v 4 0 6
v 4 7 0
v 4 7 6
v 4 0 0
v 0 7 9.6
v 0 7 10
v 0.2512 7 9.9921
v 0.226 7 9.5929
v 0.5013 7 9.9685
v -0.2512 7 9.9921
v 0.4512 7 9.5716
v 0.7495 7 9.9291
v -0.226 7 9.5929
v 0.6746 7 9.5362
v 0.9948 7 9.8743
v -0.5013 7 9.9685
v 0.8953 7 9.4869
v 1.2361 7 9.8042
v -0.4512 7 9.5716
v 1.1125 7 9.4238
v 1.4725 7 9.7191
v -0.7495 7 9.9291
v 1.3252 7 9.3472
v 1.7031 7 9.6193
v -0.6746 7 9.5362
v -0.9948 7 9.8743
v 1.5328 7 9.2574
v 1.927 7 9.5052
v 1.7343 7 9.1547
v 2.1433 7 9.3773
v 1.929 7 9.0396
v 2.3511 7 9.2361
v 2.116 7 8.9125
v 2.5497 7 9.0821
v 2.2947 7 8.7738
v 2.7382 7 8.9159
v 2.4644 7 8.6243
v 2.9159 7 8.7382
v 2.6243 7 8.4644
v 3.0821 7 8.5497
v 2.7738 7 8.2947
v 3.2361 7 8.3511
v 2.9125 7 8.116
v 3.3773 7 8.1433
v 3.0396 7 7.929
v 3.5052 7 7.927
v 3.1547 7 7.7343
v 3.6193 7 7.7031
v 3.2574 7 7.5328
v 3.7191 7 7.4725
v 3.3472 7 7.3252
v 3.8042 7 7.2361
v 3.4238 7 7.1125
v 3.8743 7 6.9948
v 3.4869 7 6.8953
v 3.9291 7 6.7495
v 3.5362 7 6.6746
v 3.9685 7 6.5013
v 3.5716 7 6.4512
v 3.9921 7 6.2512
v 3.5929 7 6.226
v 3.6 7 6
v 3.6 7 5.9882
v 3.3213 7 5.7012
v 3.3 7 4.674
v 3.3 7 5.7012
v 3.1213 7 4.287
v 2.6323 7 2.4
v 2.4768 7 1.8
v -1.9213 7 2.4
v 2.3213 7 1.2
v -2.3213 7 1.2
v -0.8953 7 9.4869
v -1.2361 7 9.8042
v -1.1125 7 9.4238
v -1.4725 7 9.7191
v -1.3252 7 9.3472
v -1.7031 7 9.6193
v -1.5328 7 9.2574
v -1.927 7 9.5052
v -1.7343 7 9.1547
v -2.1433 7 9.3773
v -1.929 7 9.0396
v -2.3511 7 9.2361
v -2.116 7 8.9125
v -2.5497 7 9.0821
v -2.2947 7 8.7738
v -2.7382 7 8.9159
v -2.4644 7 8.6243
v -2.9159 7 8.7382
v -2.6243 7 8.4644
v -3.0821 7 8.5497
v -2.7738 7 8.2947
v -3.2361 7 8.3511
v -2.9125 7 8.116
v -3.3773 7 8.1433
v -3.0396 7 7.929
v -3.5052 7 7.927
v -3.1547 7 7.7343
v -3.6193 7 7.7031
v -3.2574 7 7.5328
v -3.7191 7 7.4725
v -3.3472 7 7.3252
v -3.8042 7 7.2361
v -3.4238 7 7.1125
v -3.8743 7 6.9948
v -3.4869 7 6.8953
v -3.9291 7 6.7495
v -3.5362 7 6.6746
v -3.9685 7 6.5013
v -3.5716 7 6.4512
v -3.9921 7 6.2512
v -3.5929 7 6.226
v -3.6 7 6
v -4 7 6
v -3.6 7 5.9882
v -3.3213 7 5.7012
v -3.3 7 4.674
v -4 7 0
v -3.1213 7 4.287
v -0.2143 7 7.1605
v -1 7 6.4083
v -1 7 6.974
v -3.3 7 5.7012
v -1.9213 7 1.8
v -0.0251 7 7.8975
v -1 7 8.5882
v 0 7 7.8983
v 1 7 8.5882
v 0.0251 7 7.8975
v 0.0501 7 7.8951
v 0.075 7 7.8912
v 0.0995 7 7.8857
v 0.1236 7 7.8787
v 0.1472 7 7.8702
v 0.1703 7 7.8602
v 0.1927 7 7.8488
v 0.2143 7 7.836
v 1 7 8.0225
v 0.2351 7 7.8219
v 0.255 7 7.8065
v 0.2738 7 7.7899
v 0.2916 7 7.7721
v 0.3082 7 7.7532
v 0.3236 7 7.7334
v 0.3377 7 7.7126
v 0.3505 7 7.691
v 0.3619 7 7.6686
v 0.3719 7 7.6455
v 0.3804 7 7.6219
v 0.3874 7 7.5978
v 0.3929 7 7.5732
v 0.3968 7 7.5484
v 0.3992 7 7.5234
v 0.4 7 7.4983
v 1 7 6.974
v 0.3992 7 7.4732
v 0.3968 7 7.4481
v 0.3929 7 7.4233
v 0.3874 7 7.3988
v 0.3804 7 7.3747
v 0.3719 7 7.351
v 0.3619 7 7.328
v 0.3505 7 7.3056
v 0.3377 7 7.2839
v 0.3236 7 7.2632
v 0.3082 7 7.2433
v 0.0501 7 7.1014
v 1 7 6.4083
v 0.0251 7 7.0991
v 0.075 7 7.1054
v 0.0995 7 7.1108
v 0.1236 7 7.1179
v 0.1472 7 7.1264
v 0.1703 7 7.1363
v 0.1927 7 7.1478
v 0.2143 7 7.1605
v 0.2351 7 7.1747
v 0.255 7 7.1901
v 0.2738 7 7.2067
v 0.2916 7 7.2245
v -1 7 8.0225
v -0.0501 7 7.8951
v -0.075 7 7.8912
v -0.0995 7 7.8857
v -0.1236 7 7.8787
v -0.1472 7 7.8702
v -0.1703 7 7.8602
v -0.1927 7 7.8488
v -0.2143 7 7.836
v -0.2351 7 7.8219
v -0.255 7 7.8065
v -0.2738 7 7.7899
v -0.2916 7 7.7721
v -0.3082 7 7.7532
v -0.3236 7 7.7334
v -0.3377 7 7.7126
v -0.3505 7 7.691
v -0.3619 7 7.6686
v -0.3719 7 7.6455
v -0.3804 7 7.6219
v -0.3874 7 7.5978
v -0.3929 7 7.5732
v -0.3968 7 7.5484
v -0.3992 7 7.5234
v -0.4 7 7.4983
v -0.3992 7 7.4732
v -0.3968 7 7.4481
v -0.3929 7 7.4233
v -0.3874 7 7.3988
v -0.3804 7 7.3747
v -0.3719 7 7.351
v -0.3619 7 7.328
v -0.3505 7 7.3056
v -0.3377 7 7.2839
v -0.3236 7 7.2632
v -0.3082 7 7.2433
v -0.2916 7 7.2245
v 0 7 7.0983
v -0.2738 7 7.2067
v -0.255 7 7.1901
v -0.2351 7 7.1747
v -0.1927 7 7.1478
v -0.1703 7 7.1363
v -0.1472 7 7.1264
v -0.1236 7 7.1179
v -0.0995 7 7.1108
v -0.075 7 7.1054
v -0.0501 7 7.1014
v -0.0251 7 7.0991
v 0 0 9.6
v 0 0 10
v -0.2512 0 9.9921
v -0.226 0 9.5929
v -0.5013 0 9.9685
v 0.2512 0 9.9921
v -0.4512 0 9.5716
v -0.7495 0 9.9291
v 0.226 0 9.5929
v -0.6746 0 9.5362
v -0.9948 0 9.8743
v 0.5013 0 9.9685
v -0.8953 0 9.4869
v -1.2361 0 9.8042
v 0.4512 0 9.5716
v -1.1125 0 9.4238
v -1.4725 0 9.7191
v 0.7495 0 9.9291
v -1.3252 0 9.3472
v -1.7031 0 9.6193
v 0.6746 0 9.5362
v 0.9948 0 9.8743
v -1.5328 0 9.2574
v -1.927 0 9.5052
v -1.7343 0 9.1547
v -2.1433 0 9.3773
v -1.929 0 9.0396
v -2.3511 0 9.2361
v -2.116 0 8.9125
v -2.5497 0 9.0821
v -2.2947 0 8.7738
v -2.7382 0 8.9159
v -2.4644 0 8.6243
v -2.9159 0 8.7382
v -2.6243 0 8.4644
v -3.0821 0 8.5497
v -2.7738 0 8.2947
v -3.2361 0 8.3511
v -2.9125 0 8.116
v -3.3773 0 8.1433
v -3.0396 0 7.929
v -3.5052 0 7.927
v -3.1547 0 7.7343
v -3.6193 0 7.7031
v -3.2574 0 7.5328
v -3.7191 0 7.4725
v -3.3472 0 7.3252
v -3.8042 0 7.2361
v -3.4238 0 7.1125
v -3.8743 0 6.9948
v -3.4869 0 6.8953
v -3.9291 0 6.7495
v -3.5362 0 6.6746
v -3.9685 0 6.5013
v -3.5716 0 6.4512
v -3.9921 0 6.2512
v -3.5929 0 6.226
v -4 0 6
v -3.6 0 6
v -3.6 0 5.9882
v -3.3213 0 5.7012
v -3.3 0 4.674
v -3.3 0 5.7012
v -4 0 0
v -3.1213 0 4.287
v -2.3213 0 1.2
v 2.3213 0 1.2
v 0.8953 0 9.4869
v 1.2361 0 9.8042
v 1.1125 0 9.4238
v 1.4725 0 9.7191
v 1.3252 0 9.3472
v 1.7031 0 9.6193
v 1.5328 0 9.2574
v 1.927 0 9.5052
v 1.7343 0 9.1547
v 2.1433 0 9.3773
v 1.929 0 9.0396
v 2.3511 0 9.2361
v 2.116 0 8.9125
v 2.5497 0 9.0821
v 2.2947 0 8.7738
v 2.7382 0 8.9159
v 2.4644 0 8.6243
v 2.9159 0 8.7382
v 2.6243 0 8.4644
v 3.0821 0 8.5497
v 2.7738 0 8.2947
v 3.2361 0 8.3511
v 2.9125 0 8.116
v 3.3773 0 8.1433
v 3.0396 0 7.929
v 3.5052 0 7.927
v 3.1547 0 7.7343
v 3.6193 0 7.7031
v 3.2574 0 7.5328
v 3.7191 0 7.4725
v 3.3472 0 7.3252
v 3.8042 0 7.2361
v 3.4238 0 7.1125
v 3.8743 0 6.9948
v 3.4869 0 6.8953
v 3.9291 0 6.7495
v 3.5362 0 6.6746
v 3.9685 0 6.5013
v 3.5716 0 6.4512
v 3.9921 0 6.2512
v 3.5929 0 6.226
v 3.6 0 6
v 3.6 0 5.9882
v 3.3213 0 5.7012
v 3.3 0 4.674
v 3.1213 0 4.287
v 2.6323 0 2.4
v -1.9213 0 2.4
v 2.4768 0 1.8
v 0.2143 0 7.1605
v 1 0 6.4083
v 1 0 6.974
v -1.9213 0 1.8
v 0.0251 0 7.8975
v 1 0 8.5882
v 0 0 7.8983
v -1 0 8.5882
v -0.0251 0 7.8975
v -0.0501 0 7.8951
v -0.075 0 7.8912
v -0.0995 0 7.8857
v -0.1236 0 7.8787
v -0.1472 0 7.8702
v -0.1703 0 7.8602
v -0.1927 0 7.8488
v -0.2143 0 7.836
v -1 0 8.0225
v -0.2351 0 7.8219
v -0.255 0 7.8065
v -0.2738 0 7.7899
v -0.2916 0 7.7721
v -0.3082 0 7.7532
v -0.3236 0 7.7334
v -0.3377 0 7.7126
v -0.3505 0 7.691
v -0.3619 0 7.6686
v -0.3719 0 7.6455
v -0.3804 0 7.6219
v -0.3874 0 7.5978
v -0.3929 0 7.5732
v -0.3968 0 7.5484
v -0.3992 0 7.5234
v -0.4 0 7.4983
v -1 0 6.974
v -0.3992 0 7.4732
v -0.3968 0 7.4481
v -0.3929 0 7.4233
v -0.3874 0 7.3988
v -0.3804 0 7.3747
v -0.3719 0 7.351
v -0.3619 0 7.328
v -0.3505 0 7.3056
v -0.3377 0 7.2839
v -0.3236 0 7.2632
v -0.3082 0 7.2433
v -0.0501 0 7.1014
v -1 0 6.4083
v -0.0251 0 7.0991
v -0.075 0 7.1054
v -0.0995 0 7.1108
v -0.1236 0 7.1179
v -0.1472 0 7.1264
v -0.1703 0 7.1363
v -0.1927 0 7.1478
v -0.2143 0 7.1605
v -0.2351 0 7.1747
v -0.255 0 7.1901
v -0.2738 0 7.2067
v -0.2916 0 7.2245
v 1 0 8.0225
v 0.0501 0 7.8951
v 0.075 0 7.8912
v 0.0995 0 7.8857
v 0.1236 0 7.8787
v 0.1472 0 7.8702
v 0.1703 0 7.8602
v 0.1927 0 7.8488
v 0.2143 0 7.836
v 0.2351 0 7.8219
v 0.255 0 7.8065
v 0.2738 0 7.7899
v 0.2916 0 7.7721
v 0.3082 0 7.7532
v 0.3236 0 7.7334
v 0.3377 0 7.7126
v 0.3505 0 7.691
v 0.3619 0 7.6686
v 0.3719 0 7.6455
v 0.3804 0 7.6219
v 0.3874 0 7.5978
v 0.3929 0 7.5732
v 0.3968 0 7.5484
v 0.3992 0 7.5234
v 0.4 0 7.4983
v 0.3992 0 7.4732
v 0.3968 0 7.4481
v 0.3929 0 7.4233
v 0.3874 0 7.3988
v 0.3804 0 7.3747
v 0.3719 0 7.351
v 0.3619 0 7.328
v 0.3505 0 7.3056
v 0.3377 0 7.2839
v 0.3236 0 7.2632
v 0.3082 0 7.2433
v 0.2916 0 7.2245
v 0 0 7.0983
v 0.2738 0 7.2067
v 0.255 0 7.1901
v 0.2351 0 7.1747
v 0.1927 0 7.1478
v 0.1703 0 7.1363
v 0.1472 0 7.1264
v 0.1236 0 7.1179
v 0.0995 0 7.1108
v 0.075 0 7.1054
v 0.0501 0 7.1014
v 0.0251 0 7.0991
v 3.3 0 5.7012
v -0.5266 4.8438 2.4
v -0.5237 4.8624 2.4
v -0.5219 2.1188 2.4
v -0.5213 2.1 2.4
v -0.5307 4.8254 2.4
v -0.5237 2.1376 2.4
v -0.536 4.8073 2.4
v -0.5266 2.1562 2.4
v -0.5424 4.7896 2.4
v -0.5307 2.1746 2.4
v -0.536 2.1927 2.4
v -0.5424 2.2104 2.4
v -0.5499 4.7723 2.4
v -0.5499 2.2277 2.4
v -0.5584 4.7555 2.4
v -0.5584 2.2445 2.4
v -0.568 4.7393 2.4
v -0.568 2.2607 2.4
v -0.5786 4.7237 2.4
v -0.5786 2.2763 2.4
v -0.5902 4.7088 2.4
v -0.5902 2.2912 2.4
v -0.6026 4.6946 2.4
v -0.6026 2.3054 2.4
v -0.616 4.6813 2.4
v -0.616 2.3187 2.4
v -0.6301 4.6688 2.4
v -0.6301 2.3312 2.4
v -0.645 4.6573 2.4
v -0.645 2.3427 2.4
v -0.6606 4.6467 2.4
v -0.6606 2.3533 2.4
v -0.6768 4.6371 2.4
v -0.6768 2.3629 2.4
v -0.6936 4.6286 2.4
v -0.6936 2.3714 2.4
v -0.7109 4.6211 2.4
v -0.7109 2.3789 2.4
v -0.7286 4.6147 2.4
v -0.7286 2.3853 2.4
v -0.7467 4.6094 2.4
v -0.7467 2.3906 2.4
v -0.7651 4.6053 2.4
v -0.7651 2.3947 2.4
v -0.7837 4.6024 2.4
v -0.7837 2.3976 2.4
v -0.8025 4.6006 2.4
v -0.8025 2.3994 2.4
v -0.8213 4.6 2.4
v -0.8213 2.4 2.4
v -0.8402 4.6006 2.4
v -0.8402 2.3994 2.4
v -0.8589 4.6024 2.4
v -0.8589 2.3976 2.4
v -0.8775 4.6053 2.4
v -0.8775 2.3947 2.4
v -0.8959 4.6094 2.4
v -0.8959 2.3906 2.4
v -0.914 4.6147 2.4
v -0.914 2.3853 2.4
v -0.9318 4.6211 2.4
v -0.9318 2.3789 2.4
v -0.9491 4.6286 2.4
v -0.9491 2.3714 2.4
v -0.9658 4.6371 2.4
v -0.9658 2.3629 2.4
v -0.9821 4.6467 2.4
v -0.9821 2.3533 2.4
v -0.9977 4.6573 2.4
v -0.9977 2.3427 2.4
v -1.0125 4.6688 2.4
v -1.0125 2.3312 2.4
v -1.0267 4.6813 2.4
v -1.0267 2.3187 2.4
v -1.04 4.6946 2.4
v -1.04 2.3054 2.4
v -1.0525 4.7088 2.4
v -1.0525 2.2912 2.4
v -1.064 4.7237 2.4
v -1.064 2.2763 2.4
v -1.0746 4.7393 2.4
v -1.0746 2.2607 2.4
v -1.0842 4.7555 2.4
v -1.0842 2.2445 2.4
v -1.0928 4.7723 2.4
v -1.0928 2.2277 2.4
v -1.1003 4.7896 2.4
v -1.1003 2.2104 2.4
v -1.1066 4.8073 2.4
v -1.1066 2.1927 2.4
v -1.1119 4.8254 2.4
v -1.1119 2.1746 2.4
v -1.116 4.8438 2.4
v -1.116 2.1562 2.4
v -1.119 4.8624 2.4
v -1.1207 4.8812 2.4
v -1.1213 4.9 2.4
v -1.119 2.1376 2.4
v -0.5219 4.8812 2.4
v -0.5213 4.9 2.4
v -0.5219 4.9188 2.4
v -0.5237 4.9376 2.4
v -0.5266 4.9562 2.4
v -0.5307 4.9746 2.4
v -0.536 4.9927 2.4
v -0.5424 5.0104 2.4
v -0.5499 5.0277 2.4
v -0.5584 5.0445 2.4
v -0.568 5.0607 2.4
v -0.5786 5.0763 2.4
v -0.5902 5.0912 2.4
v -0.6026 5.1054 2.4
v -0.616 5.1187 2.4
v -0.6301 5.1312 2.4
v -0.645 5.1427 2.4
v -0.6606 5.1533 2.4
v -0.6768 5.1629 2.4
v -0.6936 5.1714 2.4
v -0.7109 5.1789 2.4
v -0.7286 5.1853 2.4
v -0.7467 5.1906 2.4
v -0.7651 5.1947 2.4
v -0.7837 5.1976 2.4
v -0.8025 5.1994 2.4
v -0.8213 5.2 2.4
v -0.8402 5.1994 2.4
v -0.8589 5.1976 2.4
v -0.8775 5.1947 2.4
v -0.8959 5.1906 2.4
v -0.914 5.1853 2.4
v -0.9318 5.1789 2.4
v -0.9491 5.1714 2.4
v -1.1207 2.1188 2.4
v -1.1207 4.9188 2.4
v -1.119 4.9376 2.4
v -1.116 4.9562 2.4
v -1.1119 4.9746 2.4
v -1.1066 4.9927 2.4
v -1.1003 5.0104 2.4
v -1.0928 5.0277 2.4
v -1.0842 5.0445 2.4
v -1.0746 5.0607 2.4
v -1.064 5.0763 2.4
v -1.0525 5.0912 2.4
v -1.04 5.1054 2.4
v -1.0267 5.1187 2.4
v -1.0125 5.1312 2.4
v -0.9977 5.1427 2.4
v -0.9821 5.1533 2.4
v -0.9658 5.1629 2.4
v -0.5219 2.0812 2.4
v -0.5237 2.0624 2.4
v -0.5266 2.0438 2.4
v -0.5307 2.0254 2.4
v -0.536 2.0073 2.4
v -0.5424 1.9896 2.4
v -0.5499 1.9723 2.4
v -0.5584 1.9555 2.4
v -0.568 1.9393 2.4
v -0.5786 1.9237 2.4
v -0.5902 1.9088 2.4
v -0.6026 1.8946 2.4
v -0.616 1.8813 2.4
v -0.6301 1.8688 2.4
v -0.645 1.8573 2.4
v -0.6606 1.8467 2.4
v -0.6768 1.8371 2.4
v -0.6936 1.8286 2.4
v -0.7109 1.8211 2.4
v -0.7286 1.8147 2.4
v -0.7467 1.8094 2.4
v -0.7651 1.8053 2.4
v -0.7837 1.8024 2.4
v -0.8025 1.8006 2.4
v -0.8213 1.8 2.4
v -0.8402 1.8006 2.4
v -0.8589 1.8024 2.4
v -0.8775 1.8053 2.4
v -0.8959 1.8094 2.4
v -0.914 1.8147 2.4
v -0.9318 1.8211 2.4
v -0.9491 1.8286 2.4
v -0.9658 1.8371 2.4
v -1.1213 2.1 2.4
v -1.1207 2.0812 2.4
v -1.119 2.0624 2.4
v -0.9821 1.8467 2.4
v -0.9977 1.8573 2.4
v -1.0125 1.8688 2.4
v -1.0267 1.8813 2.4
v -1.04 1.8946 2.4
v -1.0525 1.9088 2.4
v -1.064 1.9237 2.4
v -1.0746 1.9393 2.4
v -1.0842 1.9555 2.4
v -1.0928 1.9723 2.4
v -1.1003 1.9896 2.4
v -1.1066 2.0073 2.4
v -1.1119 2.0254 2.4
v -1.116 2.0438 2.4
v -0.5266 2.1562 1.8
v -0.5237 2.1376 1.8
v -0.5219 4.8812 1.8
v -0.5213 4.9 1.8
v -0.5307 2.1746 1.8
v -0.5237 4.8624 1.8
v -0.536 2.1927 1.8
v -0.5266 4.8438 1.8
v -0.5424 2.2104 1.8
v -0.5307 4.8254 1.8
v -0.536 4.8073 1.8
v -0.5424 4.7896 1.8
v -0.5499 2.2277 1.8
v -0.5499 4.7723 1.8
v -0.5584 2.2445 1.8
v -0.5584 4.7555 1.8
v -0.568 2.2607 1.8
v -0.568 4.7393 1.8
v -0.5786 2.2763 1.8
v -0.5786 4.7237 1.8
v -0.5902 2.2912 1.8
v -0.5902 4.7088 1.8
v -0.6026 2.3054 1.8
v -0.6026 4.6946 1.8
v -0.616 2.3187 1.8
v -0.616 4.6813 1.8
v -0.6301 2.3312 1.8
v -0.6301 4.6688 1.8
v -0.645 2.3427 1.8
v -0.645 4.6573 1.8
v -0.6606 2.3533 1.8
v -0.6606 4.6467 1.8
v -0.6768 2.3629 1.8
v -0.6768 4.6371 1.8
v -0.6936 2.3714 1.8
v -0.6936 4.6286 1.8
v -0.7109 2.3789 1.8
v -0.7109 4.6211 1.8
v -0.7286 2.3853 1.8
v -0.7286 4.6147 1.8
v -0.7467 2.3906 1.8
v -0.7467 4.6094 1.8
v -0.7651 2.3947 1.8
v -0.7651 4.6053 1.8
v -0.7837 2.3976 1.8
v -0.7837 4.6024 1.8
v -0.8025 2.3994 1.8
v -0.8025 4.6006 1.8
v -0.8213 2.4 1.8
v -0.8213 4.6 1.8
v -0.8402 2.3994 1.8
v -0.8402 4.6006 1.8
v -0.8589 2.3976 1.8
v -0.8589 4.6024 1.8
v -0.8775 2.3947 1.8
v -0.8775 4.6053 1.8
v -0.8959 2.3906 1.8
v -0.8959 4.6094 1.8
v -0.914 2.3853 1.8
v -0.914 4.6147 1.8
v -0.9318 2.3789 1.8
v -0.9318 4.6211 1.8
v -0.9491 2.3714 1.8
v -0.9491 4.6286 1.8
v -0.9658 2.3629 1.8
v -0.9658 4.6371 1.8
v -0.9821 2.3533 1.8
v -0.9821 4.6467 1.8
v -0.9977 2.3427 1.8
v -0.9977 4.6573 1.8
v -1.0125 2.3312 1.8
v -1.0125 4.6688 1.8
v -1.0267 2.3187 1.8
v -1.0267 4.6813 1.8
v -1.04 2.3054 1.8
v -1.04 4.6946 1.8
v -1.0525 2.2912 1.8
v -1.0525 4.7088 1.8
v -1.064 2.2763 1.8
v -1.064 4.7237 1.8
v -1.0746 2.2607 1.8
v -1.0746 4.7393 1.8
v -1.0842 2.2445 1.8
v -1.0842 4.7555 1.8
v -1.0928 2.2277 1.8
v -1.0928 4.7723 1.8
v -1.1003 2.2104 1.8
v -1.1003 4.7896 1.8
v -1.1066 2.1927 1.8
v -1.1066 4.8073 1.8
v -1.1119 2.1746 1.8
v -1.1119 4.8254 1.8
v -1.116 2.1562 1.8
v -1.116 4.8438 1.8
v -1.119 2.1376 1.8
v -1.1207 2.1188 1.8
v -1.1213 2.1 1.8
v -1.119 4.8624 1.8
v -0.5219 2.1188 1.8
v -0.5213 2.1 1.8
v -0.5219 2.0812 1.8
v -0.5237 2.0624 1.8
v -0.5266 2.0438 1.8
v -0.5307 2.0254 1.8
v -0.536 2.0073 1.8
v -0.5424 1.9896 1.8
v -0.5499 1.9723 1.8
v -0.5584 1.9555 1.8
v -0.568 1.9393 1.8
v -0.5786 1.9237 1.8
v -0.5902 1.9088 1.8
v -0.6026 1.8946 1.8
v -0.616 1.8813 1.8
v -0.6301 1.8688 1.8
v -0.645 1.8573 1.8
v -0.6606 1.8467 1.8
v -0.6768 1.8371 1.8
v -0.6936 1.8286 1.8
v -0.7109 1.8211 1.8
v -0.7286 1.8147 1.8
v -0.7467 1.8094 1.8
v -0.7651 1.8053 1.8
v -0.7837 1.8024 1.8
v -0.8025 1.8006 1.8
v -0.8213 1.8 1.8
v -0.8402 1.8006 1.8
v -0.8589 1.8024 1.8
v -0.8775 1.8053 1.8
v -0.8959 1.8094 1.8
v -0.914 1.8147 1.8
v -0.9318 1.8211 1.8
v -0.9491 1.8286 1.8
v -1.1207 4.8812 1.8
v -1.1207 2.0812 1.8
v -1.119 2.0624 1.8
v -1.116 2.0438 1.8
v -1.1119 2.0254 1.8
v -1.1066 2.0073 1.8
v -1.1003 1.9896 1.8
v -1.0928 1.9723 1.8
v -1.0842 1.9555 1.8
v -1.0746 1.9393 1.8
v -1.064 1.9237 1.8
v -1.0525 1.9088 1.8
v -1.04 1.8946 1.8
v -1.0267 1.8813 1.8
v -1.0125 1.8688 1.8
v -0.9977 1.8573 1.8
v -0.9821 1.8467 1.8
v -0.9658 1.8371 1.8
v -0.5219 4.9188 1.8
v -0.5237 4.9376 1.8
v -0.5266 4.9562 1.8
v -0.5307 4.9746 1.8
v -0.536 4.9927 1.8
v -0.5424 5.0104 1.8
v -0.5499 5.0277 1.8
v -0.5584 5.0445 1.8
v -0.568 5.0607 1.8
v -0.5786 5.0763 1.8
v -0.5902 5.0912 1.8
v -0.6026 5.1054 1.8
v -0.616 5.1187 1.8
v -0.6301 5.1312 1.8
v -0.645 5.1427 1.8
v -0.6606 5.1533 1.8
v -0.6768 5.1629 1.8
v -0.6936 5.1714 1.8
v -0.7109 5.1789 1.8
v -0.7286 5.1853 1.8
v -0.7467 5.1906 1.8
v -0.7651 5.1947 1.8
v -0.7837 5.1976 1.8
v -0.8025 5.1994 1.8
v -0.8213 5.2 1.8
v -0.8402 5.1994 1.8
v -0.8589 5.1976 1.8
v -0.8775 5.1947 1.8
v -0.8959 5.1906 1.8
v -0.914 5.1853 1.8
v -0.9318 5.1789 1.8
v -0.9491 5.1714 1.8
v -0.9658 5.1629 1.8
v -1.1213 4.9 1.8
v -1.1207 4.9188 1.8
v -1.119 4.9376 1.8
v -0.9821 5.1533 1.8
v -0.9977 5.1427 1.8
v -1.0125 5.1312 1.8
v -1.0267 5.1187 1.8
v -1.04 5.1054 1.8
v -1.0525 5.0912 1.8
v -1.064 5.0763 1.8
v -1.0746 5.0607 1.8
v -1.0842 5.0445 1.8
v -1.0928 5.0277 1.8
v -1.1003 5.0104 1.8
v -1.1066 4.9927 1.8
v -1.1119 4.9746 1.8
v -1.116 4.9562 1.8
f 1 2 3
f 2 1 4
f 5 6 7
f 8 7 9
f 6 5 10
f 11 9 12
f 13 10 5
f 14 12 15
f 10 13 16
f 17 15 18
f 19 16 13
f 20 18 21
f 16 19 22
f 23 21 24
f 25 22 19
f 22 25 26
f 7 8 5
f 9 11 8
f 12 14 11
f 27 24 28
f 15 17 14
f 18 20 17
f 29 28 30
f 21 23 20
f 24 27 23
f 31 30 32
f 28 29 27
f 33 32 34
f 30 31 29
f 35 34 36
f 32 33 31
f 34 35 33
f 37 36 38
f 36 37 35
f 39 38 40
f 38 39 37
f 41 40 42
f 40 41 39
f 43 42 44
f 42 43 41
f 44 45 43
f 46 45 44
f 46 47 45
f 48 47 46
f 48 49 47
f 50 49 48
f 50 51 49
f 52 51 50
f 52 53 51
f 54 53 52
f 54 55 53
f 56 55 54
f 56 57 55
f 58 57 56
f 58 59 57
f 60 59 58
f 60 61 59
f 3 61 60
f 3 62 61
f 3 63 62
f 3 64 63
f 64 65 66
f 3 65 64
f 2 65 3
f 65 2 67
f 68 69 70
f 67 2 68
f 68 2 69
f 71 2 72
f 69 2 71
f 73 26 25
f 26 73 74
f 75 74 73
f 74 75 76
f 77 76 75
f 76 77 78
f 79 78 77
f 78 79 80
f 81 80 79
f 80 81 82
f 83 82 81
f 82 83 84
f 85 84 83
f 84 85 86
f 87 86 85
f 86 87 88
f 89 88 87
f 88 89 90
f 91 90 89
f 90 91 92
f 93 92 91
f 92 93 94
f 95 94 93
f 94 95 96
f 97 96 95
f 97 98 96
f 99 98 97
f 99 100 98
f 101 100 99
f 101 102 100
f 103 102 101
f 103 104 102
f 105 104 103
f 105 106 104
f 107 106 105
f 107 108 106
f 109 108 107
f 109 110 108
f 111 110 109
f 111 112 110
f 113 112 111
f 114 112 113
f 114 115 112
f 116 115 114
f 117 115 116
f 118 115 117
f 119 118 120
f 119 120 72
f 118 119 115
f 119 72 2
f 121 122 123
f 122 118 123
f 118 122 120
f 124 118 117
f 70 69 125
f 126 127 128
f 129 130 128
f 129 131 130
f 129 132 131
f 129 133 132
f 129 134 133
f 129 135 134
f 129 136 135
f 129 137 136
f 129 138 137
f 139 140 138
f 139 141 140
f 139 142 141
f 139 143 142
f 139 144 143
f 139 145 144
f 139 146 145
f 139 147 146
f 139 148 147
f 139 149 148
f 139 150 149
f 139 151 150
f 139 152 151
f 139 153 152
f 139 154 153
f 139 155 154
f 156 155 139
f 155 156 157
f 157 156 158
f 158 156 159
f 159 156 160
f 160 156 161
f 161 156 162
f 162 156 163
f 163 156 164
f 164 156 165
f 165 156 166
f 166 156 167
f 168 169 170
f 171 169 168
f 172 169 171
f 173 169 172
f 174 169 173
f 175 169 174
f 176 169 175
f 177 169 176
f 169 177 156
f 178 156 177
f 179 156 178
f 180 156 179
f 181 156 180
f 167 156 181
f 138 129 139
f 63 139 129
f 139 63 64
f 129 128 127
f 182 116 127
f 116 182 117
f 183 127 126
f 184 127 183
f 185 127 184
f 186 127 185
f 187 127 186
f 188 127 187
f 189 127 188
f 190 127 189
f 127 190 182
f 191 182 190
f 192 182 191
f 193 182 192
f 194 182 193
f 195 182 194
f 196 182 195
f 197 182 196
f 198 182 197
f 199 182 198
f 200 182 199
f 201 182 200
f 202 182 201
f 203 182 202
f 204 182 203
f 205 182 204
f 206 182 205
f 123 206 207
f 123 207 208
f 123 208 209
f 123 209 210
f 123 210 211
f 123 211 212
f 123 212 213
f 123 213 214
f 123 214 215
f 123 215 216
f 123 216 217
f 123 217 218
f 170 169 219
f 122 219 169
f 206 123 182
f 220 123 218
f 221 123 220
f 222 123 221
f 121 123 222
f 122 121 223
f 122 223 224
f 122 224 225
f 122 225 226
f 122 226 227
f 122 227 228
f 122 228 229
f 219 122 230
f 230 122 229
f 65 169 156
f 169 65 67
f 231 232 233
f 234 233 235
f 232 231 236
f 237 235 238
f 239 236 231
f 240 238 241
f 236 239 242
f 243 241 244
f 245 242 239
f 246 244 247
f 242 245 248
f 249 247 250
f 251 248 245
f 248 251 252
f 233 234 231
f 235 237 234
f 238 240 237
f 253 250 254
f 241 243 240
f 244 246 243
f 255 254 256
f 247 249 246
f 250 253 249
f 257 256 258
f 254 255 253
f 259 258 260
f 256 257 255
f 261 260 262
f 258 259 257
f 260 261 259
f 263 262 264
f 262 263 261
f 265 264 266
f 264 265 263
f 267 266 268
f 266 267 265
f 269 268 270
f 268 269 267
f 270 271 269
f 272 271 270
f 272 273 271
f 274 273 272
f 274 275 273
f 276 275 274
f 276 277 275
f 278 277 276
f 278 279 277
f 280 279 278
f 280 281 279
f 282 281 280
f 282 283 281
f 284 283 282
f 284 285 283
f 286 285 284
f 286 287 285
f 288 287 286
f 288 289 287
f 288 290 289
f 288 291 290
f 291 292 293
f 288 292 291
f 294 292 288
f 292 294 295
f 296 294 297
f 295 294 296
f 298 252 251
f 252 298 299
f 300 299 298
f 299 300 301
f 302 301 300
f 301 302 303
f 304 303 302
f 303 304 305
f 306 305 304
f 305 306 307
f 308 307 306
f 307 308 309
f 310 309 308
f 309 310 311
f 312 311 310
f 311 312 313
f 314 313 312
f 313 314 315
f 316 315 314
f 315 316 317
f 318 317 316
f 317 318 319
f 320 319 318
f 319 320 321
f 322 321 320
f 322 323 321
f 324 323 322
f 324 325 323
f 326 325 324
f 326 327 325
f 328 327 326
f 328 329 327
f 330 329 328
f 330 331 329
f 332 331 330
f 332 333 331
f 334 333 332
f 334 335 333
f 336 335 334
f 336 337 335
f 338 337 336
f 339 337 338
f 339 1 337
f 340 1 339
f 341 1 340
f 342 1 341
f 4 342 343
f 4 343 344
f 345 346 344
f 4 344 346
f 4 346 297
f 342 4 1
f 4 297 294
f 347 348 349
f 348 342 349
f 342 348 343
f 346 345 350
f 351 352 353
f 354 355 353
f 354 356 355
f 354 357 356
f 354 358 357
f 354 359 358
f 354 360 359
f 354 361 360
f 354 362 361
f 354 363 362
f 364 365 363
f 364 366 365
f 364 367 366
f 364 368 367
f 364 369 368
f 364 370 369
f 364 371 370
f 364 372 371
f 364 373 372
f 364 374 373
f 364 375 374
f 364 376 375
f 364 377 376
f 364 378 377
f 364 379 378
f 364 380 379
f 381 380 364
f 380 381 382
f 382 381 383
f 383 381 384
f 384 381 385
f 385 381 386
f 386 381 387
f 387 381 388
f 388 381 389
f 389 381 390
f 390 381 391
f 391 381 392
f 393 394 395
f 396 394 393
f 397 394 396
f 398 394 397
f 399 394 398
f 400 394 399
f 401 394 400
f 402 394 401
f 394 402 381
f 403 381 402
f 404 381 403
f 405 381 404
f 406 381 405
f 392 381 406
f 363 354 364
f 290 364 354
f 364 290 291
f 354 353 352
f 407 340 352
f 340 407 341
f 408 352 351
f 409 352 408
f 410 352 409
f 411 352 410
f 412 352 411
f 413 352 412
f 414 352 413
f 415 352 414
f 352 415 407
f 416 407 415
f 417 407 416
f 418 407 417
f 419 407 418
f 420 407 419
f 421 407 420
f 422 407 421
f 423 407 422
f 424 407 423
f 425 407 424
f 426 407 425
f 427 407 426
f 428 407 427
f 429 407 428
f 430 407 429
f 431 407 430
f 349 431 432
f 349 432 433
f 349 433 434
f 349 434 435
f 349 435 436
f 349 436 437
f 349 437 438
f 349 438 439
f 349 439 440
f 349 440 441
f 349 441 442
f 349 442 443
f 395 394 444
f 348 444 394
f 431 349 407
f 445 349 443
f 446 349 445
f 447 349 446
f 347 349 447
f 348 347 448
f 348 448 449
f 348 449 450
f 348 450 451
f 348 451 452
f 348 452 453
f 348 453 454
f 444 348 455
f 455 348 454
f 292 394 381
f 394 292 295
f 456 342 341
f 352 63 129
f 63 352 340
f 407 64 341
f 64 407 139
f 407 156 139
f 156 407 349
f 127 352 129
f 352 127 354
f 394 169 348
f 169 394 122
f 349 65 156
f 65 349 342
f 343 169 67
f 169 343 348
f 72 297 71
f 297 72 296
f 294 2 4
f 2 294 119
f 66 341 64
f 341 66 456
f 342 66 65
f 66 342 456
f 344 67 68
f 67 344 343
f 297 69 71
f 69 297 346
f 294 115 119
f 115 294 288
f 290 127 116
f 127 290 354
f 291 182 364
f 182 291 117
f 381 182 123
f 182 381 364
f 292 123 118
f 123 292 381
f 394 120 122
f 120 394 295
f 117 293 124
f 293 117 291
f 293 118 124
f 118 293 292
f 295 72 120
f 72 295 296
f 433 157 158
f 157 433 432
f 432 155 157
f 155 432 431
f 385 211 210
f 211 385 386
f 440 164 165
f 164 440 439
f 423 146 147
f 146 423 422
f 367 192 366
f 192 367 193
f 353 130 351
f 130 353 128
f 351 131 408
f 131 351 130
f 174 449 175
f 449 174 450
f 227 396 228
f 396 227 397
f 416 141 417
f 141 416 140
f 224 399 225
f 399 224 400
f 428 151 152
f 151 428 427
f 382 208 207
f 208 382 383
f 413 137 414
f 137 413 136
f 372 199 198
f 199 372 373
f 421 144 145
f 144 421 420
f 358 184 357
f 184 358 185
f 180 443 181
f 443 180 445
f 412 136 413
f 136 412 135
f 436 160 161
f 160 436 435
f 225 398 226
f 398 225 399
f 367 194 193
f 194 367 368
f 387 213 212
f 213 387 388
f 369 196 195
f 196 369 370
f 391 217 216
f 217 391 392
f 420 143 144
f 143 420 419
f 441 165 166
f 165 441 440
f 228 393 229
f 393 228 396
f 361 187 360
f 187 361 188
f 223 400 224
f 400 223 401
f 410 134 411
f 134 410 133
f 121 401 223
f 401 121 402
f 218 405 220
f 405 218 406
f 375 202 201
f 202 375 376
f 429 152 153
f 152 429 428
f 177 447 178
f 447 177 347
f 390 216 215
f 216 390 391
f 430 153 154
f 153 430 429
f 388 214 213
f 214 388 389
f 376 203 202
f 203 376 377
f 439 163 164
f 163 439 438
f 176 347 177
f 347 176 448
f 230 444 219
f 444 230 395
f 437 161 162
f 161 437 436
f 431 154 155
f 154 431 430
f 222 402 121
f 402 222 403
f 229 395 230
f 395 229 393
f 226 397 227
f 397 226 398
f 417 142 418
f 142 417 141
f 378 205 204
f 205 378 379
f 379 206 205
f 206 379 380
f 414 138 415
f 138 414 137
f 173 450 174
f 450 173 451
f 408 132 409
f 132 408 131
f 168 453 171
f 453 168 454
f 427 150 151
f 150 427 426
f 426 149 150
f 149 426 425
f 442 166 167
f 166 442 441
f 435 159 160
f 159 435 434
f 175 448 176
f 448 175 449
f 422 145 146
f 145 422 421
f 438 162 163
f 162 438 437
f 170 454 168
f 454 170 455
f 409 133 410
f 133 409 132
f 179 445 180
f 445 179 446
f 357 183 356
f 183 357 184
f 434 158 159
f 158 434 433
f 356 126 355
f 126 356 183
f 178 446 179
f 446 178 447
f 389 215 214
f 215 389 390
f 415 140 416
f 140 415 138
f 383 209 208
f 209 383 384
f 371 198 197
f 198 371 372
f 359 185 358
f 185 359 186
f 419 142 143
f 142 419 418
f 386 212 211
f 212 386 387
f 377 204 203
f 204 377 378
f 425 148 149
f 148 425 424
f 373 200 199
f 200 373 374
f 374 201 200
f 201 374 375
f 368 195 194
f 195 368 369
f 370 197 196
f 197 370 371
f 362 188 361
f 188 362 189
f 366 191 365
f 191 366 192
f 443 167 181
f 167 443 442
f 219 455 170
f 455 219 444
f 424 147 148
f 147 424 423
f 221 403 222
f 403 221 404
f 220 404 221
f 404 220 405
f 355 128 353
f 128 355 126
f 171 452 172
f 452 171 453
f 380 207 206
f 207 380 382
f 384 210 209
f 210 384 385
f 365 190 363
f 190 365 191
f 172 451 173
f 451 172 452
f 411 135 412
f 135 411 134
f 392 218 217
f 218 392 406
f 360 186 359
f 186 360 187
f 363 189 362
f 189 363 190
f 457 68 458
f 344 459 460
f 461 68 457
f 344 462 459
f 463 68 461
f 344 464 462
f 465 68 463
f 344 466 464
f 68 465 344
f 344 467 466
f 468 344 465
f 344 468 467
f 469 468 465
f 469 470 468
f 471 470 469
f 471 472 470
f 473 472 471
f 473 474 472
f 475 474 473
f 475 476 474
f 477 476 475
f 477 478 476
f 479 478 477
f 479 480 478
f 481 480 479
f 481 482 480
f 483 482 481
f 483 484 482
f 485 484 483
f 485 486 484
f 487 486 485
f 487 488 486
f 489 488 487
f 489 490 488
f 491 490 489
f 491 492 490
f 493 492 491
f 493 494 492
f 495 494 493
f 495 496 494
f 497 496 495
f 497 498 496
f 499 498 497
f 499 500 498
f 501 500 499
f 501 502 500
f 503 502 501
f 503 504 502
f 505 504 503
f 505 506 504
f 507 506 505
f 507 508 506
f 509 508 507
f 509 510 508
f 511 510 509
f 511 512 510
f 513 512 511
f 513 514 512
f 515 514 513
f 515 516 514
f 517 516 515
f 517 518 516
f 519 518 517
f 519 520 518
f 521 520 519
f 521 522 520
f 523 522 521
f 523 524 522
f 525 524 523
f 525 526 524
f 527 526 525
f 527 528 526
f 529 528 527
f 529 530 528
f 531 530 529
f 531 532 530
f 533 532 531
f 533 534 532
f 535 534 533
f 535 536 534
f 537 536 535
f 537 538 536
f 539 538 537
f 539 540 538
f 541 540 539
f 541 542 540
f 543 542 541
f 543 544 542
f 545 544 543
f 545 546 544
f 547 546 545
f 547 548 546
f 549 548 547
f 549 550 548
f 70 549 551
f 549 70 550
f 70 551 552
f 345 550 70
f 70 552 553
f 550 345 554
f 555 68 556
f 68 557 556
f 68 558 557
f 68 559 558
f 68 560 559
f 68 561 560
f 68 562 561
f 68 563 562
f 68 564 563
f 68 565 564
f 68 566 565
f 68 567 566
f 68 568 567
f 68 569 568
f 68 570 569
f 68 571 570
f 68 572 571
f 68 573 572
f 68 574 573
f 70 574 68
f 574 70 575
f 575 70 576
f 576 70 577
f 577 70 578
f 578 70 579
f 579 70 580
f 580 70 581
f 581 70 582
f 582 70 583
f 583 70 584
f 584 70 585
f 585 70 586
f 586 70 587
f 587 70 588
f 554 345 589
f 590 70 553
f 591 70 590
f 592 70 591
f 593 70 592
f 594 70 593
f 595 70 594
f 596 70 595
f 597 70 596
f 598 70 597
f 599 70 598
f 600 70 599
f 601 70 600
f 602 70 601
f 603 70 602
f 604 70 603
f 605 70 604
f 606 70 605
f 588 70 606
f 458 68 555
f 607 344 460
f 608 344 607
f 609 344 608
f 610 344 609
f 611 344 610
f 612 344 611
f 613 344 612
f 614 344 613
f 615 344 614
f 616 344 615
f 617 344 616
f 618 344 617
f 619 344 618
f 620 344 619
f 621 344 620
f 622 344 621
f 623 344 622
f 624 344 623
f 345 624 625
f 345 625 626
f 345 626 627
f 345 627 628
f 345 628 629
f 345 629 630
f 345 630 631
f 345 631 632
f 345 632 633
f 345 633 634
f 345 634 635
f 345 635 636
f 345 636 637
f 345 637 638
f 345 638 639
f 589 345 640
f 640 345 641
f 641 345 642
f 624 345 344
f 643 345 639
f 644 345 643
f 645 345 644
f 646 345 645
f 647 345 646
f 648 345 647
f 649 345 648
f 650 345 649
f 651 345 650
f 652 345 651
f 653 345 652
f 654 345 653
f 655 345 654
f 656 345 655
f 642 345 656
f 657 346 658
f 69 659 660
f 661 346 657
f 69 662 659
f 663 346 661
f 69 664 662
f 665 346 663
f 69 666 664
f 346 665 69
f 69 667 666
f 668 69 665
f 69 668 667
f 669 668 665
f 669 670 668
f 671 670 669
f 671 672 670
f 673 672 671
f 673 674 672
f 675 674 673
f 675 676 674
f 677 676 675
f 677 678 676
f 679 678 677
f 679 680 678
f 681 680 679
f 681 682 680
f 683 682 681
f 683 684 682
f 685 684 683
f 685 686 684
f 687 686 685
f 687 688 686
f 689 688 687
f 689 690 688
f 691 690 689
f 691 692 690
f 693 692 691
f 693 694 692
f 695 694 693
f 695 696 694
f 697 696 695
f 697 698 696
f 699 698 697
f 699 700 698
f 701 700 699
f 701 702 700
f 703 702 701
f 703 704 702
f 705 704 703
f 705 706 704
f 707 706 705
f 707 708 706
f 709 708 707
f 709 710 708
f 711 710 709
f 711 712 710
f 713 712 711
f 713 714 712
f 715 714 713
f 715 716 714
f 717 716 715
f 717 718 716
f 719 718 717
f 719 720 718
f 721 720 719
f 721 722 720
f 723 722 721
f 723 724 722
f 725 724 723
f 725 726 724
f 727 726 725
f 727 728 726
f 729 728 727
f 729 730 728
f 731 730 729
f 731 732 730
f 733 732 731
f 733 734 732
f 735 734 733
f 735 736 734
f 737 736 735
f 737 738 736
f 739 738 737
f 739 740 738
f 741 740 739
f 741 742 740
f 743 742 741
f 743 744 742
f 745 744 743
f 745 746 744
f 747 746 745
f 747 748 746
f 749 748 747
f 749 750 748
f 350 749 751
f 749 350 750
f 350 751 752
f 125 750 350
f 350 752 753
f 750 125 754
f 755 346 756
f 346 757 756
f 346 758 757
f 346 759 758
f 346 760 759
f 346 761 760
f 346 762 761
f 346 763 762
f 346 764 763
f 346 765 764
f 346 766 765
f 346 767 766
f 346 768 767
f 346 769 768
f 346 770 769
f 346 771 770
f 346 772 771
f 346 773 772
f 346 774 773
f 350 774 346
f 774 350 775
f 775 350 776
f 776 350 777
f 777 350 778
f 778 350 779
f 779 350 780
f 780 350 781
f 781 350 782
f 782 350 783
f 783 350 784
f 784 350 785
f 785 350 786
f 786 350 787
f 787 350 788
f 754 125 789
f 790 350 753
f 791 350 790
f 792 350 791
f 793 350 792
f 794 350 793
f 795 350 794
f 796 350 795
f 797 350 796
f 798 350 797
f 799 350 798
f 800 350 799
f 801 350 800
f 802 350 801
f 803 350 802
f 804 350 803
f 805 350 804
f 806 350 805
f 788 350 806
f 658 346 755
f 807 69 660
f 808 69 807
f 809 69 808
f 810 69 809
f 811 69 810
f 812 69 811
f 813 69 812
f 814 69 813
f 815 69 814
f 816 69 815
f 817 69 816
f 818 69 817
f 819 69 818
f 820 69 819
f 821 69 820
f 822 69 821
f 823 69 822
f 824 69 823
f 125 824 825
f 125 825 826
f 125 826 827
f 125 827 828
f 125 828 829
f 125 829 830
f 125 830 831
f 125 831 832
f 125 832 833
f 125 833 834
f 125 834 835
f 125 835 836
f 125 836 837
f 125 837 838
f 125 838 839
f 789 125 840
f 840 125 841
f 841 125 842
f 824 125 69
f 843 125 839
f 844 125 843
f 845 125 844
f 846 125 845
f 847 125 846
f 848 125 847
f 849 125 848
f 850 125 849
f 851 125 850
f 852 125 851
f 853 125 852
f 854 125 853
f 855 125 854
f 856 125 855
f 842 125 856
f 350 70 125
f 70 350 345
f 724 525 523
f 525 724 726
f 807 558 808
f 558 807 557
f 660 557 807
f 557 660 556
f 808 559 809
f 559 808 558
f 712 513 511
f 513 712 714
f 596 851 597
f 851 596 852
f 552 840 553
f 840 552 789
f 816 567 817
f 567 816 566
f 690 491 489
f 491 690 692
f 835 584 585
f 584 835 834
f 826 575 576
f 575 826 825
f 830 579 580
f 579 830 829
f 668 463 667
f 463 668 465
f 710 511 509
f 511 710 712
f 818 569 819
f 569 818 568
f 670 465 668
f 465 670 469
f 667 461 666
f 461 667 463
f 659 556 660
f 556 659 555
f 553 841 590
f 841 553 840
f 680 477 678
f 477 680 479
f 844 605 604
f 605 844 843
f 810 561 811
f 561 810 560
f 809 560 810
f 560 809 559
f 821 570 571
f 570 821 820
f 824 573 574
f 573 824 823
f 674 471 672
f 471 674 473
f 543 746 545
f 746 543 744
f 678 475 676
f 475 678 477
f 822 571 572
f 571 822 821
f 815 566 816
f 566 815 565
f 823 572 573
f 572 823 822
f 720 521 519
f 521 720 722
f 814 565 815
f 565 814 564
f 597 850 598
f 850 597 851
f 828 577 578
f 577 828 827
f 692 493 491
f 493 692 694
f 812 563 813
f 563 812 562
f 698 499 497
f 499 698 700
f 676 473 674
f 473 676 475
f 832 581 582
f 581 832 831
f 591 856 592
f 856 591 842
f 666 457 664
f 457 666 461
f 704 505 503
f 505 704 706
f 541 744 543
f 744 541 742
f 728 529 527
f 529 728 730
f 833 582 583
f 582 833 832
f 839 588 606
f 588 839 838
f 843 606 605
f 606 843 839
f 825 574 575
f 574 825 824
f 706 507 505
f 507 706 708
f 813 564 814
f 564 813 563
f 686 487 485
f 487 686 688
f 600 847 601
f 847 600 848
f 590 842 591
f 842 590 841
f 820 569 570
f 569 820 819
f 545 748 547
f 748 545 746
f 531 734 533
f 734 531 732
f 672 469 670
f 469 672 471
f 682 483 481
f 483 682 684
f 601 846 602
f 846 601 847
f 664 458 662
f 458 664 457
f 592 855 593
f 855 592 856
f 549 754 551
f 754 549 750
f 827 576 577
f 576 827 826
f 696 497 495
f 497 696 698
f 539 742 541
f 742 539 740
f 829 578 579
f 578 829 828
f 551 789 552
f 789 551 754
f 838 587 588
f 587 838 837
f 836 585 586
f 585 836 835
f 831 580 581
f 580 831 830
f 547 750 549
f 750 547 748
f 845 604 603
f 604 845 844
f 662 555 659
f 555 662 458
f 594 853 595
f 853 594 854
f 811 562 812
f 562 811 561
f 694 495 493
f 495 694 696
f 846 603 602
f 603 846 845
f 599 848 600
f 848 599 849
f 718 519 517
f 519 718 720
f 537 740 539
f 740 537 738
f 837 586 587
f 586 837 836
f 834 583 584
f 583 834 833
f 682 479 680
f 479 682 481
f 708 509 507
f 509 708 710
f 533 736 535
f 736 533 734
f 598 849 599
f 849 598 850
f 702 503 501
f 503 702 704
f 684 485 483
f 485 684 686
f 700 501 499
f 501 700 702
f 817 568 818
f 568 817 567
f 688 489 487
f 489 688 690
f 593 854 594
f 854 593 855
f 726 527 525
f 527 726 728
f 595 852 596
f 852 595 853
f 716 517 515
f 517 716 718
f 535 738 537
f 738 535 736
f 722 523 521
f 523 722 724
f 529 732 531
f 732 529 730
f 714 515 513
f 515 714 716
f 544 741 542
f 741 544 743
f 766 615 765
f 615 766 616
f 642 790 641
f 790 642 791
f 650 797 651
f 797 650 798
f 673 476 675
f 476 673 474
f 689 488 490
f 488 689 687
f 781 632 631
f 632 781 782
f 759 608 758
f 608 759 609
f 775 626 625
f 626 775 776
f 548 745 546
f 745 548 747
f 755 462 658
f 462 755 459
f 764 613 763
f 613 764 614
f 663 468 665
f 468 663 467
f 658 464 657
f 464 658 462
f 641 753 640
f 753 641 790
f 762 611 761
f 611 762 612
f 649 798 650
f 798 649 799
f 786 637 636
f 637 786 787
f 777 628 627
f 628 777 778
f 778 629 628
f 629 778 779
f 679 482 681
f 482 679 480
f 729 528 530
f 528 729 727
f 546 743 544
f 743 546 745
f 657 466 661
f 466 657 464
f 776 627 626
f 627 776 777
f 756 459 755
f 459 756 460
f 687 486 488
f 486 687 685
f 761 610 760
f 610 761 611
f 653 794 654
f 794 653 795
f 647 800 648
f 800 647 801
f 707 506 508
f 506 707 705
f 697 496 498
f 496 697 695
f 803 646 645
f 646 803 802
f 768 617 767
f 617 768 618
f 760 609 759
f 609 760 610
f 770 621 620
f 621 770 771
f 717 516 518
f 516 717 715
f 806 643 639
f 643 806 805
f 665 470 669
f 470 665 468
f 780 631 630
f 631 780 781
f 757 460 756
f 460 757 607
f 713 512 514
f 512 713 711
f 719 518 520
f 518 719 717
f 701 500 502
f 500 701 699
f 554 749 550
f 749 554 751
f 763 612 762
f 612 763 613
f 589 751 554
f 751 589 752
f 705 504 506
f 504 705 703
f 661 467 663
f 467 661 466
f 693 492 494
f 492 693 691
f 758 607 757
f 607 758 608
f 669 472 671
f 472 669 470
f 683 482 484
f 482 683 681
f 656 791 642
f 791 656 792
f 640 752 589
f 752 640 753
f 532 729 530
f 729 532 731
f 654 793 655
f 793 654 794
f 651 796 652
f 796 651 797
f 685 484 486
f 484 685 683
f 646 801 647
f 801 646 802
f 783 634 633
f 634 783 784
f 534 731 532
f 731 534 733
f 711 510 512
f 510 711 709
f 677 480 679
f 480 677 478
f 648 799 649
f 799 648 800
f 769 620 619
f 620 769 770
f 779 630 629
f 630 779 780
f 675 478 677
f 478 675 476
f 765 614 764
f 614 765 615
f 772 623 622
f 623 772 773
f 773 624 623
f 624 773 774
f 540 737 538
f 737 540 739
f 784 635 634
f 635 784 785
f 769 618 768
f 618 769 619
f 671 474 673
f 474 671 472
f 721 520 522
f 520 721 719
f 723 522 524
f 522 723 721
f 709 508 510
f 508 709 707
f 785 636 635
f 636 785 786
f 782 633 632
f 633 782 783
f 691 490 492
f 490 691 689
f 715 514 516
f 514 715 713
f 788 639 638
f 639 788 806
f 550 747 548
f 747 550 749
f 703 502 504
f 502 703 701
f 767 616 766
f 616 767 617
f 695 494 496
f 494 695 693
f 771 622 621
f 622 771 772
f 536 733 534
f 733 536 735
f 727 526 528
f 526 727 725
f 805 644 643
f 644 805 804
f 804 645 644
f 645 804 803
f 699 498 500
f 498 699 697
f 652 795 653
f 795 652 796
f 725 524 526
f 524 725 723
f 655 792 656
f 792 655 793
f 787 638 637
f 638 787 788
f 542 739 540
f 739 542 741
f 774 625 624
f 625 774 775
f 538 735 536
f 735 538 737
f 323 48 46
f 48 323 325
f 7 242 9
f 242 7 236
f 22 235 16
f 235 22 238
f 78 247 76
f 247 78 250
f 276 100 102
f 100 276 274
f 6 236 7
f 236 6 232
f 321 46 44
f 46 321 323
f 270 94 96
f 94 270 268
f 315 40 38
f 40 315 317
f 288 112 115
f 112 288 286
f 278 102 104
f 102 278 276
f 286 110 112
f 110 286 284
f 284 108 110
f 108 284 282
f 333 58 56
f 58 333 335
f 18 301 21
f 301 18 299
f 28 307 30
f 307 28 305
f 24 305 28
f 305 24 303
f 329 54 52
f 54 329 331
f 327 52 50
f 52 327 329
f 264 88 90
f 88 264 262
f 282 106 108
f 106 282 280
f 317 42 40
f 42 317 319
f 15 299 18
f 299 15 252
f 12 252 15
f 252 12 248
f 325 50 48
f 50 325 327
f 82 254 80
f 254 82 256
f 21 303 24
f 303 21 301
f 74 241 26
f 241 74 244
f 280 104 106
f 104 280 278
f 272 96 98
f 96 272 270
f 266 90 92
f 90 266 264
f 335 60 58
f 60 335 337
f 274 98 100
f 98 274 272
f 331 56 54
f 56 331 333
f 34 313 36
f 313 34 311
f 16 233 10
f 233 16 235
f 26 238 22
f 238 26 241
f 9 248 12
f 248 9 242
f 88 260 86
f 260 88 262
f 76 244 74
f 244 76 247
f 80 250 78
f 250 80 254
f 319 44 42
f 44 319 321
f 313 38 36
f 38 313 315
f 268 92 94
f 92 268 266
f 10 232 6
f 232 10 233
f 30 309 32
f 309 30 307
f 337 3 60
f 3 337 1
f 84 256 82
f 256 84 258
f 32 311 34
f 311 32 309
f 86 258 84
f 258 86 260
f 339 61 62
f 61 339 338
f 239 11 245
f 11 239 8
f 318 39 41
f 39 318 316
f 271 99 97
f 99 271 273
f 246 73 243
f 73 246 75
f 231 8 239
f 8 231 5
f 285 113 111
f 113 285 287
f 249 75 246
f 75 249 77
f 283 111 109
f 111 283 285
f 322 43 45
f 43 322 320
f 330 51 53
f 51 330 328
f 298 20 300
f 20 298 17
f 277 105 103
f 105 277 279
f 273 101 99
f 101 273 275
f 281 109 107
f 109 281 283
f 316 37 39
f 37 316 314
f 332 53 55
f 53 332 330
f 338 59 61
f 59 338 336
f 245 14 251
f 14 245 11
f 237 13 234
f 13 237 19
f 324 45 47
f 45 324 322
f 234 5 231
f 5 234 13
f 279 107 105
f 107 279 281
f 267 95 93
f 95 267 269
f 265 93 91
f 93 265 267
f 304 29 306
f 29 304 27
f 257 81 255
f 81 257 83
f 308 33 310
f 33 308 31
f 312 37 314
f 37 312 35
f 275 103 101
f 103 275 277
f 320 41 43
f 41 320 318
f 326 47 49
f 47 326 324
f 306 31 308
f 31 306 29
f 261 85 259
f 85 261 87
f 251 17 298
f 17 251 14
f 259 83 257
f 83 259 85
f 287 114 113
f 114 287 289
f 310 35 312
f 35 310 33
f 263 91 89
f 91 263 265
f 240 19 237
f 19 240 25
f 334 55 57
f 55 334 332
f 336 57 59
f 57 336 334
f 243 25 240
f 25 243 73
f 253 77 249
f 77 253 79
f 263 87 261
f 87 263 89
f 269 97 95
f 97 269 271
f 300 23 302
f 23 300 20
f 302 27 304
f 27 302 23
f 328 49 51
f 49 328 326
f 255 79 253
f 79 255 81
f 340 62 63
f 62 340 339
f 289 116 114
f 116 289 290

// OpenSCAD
/* [End effector: ]*/
Type = "Arc"; //["Arc", "Flat", "Texture"]
height = 10; //[8.0: 12.0] float
endThickness = 0.4; //[0.2:1] float

/* [Bistable Switch:]*/
Connected = false; //[true, false]

/* [Parameters: ] */
angle = 45; //[40 : 80]
thickness = 0.4;//[0.2 : 1.0] float
beamLength = 3.0; // [2.1 : 6.0] float

/* [Mesh Design: ] */
Xnumber = 3;//[1:100]
Ynumber = 3;//[1:100]
orientation = 0;//[0,90]

module __Customizer_Limit__ () {}
shown_by_customizer = false;

/* Constants */
depth = 7;//[1 : 10]
beamDistance = 0.6;
totalWidth = 4; //half of it
blockWidth = 1; //half of it
blockHeight = (2 * thickness + beamDistance) / cos(angle) + 0.2;
constrainWidth = totalWidth - blockWidth - beamLength * cos(angle);
constrainHeight = lengthOffsetBeam(thickness) * sin(angle) + 0.4;
echo(constrainHeight);
bottomHeight = 1.2;
wedgeWidth = 0.8; 
totalHeight = height; //max(2 + beamDistance + constrainHeight + beamLength * sin(angle) + blockHeight, height);

holeDiameter = 0.4;

resolution = 100;
$fn = resolution;

function lengthOffsetBeam(offset) = beamLength + offset / tan(angle) + offset * tan(angle);

function getWidth() = min(endThickness, (thickness + beamDistance) * sin(angle)); //(constrainWidth - thickness / sin(angle))

/* Bistable Switch */
module half(angle, beamLength, thickness){  
    union(){
        //bottom
        cube([totalWidth, depth, bottomHeight]);
        
        //constraint
        translate([totalWidth - constrainWidth, 0, bottomHeight]) 
        cube([constrainWidth, depth, constrainHeight]);
        translate([totalWidth - thickness * 2 + 0.1, 0, 0]) 
        cube([thickness -0.1, depth, bottomHeight + constrainHeight + (beamDistance + thickness) / cos(angle)]);
        
        union(){
        //block
        translate([0, 0, bottomHeight + constrainHeight + beamLength * sin(angle)]) cube([blockWidth, depth, blockHeight]);
        //r = sqrt(blockWidth*blockWidth+blockHeight*blockHeight/4);
        //translate([0, 0, 1.2 + blockHeight/2+constrainHeight + beamLength * sin(angle)]) rotate([-90,0,0]) cylinder(depth,r, r);
        
        //beam1
        translate([blockWidth - thickness * sin(angle), 0, bottomHeight + constrainHeight + lengthOffsetBeam(thickness) * sin(angle) -thickness * cos(angle)]) rotate([0, angle, 0]) cube([lengthOffsetBeam(thickness), depth, thickness]);
        
       //beam2
       intersection() {
            cube([totalWidth, depth, blockHeight + bottomHeight + constrainHeight + beamLength * sin(angle)]);
            translate([blockWidth - thickness * sin(angle), 0, blockHeight + bottomHeight + constrainHeight + beamLength * sin(angle)- thickness * cos(angle)]) rotate([0, angle, 0]) cube([lengthOffsetBeam(2 * thickness + 0.6), depth, thickness]);
        }; 
    }
        
        //2.67 here is hardcoded
        /*intersection(){
            translate([0,0,2.67+constrainHeight + beamLength * sin(angle) + blockHeight - totalWidth]) rotate([-90,0,0]) cylinder(depth, 2.8, 2.8);
            translate([0,0,blockHeight + 1.2 + constrainHeight + beamLength * sin(angle)]) cube([totalWidth, depth, 4]);
        };*/
        
        //blockHeight + beamLength * sin(angle) - (totalWidth - blockWidth - 0.4) * tan(angle)
        
        translate([totalWidth - getWidth(), 0, bottomHeight + constrainHeight]) cube([getWidth(), depth, (thickness + beamDistance) / cos(angle)]);//blockHeight + beamLength * sin(angle) - (totalWidth - blockWidth - 0.4) * tan(angle)
    };
    
    translate([totalWidth - constrainWidth, 0, bottomHeight]) polyhedron(
    points=[[0,0,0],[0,depth,0],[0,depth,constrainHeight],[0,0,constrainHeight],[-wedgeWidth,0,0], [-wedgeWidth,depth,0]],
    faces=[[0,1,2,3],[5,4,3,2],[0,4,5,1],[0,3,4],[5,2,1]]
    );
};
            
module bistableSwitch(angle, beamLength, thickness){
    difference(){
        union(){
            half(angle, beamLength, thickness);
            mirror([1,0,0]) half(angle, beamLength, thickness);
        };
        //hole
        translate([0, 0, blockHeight / 2 + 1.2 + constrainHeight + beamLength * sin(angle)]) rotate([-90,0,0]) cylinder(depth,holeDiameter,holeDiameter);
    } 
    
    //pad
    difference(){
        translate([-(totalWidth - constrainWidth), 0, 1.2 + 0.6])       difference(){
                cube([(totalWidth - constrainWidth) * 2, depth,       0.6]);
                translate([0,-1,-1]) cube([1.2, depth + 2, 0.8 +       2]);
        };
        //hole
        translate([-(totalWidth - constrainWidth-1.3 - 1), depth/2+1.4, 0]) cylinder(1.2+0.6+thickness+0.5, 0.3, 0.3);
        translate([-(totalWidth - constrainWidth-1.3 - 1), depth/2-1.4, 0]) cylinder(1.2+0.6+thickness+0.5, 0.3, 0.3);
    }
}

/* End Effector */
module arc(angle, beamLength, thickness){
    translate([0,0, totalHeight - totalWidth]) intersection(){
        translate([-totalWidth,0,0]) cube([totalWidth * 2, depth, totalWidth]);
        rotate([-90,0,0]) difference(){
             cylinder(depth, totalWidth, totalWidth);
             cylinder(depth, totalWidth - endThickness, totalWidth - endThickness);
        };
    };
    
    // arc height =  totalHeight - totalWidth
    //bistable wall height: 1.2 + constrainHeight + blockHeight + beamLength * sin(angle) - (totalWidth - blockWidth - 0.4) * tan(angle)]);
    foo = max(totalHeight - totalWidth -constrainHeight - bottomHeight - (thickness + beamDistance) / cos(angle), 0);
    //connect to the spring
    translate([totalWidth - endThickness, 0, bottomHeight + constrainHeight + (thickness + beamDistance) / cos(angle)]) cube([endThickness, depth, foo]); 
    
    mirror([1,0,0]) translate([totalWidth - endThickness, 0, bottomHeight + constrainHeight + (thickness + beamDistance) / cos(angle)]) cube([endThickness, depth, foo]);  
}

module square(angle, beamLength, thickness){ 
    translate([-totalWidth, 0, 0]) difference(){
        cube([totalWidth * 2, depth, totalHeight]);
        translate([endThickness,-1,endThickness]) cube([(totalWidth - endThickness) * 2, depth+2, totalHeight - endThickness*2]);
        };
}

//text
module tCell(){
    translate([0, 0, 0.1]) rotate([90, 0, 0]) linear_extrude(height = 0.2) text(text = str(height," ", endThickness, " ", angle," ", thickness," ",beamLength), size = 0.8, halign = "center");
    }

/* Types of cells */
module stiffnessArcCell(angle, beamLength, thickness){
    bistableSwitch(angle, beamLength, thickness);
    arc(angle, beamLength, thickness);
    //tCell();
}

module stiffnessSquareCell(angle, beamLength, thickness){
    bistableSwitch(angle, beamLength, thickness);
    square(angle, beamLength, thickness);
    //tCell();
}

module heightArcCell(angle, beamLength, thickness){
    connectLength = totalHeight- (1 + constrainHeight + beamLength * sin(angle)+blockHeight);

    bistableSwitch(angle, beamLength, thickness);
    translate([-endThickness/2,0, blockHeight + 1 + constrainHeight + beamLength * sin(angle)]) cube([endThickness, depth, connectLength]);
    arc(angle, beamLength,thickness);
    //tCell();
}


module heightSquareCell(angle, beamLength, thickness){
    connectLength = totalHeight - (1.2 + constrainHeight + beamLength * sin(angle)+blockHeight);
    
    bistableSwitch(angle, beamLength, thickness);
    translate([-endThickness/2,0, blockHeight + bottomHeight + constrainHeight + beamLength * sin(angle)]) cube([endThickness, depth, connectLength]);
    square(angle, beamLength, thickness);
    //tCell();
}

module textureSquareCell(angle, beamLength, thickness){
    bistableSwitch(angle, beamLength, thickness);
 
    intersection(){
        translate([0,0, 0.6 + blockHeight + constrainHeight + beamLength * sin(angle)]) rotate([0,-40,0]) cube([0.4, depth, 3]);
        translate([-totalWidth,0,0])cube([totalWidth, depth, bottomHeight +1 + blockHeight + constrainHeight + beamLength * sin(angle)]);
    };
    
    
    intersection(){
        translate([-0.5,0, 0.6+ blockHeight + constrainHeight    + beamLength * sin(angle)]) rotate([0,40,0]) cube([0.4, depth, 3]);
        cube([totalWidth, depth, 1+1.2+ blockHeight + constrainHeight + beamLength * sin(angle)]);
    };
    
    h = 1 + bottomHeight + constrainHeight + beamLength * sin(angle)+blockHeight;
    difference(){
        translate([-totalWidth, 0, 0]) difference(){
        cube([totalWidth * 2, depth, h]);
        translate([endThickness,-1,endThickness]) cube([(totalWidth - endThickness) * 2, depth+2, h - endThickness*2]);
        };
        translate([-blockWidth,-1, blockHeight + bottomHeight + constrainHeight + beamLength * sin(angle)]) cube([blockWidth*2, depth+2, 3]);
    }
    //tCell();
}

module hairTop(){
    h = 1 + bottomHeight + constrainHeight + beamLength * sin(angle)+blockHeight;
    for (i=[1:totalWidth]){
        translate([(i-1)*1 + 0.8, 0 ,h])
            cube([0.2, depth, 3]);
        mirror([1,0,0]) translate([(i-1)*1 + 0.8, 0 ,h])
            cube([0.2, depth, 3]);
    }
}

module hairSide(){
    h = bottomHeight + constrainHeight + beamLength * sin(angle)-0.3;
    for (j=[1:4]){
       translate([totalWidth, 0, (j-1)*1+h])
            cube([3, depth, 0.2]);
       mirror([1,0,0]) translate([totalWidth, 0, (j-1)*1+h]) cube([3, depth, 0.2]);
    }
}

switchHeight = 1 + constrainHeight + thickness / cos(angle) - 0.4;

/* Grid of cells*/
module tHolder(){
    translate([0, -1.1, 1]) rotate([90, 0, 0]) linear_extrude(height = 0.2) text(text = str(angle," ", thickness), size = 0.8, halign = "center");
    }
    
module cellHolder(){
    translate([0, totalWidth + 0.6 - 1.1, switchHeight / 2 + 0.5]) difference(){
        cube([totalWidth * 2 + 1.2, totalWidth * 2 + 1.2, switchHeight + 1.6],center=true);
        translate([0, 0, 1.6]) cube([totalWidth * 2, 7.2, switchHeight],center=true);
        }
    //tHolder();
}

stiffnessArcCell(angle, beamLength, thickness);
//textureSquareCell(angle, beamLength, thickness);
//hairTop();
